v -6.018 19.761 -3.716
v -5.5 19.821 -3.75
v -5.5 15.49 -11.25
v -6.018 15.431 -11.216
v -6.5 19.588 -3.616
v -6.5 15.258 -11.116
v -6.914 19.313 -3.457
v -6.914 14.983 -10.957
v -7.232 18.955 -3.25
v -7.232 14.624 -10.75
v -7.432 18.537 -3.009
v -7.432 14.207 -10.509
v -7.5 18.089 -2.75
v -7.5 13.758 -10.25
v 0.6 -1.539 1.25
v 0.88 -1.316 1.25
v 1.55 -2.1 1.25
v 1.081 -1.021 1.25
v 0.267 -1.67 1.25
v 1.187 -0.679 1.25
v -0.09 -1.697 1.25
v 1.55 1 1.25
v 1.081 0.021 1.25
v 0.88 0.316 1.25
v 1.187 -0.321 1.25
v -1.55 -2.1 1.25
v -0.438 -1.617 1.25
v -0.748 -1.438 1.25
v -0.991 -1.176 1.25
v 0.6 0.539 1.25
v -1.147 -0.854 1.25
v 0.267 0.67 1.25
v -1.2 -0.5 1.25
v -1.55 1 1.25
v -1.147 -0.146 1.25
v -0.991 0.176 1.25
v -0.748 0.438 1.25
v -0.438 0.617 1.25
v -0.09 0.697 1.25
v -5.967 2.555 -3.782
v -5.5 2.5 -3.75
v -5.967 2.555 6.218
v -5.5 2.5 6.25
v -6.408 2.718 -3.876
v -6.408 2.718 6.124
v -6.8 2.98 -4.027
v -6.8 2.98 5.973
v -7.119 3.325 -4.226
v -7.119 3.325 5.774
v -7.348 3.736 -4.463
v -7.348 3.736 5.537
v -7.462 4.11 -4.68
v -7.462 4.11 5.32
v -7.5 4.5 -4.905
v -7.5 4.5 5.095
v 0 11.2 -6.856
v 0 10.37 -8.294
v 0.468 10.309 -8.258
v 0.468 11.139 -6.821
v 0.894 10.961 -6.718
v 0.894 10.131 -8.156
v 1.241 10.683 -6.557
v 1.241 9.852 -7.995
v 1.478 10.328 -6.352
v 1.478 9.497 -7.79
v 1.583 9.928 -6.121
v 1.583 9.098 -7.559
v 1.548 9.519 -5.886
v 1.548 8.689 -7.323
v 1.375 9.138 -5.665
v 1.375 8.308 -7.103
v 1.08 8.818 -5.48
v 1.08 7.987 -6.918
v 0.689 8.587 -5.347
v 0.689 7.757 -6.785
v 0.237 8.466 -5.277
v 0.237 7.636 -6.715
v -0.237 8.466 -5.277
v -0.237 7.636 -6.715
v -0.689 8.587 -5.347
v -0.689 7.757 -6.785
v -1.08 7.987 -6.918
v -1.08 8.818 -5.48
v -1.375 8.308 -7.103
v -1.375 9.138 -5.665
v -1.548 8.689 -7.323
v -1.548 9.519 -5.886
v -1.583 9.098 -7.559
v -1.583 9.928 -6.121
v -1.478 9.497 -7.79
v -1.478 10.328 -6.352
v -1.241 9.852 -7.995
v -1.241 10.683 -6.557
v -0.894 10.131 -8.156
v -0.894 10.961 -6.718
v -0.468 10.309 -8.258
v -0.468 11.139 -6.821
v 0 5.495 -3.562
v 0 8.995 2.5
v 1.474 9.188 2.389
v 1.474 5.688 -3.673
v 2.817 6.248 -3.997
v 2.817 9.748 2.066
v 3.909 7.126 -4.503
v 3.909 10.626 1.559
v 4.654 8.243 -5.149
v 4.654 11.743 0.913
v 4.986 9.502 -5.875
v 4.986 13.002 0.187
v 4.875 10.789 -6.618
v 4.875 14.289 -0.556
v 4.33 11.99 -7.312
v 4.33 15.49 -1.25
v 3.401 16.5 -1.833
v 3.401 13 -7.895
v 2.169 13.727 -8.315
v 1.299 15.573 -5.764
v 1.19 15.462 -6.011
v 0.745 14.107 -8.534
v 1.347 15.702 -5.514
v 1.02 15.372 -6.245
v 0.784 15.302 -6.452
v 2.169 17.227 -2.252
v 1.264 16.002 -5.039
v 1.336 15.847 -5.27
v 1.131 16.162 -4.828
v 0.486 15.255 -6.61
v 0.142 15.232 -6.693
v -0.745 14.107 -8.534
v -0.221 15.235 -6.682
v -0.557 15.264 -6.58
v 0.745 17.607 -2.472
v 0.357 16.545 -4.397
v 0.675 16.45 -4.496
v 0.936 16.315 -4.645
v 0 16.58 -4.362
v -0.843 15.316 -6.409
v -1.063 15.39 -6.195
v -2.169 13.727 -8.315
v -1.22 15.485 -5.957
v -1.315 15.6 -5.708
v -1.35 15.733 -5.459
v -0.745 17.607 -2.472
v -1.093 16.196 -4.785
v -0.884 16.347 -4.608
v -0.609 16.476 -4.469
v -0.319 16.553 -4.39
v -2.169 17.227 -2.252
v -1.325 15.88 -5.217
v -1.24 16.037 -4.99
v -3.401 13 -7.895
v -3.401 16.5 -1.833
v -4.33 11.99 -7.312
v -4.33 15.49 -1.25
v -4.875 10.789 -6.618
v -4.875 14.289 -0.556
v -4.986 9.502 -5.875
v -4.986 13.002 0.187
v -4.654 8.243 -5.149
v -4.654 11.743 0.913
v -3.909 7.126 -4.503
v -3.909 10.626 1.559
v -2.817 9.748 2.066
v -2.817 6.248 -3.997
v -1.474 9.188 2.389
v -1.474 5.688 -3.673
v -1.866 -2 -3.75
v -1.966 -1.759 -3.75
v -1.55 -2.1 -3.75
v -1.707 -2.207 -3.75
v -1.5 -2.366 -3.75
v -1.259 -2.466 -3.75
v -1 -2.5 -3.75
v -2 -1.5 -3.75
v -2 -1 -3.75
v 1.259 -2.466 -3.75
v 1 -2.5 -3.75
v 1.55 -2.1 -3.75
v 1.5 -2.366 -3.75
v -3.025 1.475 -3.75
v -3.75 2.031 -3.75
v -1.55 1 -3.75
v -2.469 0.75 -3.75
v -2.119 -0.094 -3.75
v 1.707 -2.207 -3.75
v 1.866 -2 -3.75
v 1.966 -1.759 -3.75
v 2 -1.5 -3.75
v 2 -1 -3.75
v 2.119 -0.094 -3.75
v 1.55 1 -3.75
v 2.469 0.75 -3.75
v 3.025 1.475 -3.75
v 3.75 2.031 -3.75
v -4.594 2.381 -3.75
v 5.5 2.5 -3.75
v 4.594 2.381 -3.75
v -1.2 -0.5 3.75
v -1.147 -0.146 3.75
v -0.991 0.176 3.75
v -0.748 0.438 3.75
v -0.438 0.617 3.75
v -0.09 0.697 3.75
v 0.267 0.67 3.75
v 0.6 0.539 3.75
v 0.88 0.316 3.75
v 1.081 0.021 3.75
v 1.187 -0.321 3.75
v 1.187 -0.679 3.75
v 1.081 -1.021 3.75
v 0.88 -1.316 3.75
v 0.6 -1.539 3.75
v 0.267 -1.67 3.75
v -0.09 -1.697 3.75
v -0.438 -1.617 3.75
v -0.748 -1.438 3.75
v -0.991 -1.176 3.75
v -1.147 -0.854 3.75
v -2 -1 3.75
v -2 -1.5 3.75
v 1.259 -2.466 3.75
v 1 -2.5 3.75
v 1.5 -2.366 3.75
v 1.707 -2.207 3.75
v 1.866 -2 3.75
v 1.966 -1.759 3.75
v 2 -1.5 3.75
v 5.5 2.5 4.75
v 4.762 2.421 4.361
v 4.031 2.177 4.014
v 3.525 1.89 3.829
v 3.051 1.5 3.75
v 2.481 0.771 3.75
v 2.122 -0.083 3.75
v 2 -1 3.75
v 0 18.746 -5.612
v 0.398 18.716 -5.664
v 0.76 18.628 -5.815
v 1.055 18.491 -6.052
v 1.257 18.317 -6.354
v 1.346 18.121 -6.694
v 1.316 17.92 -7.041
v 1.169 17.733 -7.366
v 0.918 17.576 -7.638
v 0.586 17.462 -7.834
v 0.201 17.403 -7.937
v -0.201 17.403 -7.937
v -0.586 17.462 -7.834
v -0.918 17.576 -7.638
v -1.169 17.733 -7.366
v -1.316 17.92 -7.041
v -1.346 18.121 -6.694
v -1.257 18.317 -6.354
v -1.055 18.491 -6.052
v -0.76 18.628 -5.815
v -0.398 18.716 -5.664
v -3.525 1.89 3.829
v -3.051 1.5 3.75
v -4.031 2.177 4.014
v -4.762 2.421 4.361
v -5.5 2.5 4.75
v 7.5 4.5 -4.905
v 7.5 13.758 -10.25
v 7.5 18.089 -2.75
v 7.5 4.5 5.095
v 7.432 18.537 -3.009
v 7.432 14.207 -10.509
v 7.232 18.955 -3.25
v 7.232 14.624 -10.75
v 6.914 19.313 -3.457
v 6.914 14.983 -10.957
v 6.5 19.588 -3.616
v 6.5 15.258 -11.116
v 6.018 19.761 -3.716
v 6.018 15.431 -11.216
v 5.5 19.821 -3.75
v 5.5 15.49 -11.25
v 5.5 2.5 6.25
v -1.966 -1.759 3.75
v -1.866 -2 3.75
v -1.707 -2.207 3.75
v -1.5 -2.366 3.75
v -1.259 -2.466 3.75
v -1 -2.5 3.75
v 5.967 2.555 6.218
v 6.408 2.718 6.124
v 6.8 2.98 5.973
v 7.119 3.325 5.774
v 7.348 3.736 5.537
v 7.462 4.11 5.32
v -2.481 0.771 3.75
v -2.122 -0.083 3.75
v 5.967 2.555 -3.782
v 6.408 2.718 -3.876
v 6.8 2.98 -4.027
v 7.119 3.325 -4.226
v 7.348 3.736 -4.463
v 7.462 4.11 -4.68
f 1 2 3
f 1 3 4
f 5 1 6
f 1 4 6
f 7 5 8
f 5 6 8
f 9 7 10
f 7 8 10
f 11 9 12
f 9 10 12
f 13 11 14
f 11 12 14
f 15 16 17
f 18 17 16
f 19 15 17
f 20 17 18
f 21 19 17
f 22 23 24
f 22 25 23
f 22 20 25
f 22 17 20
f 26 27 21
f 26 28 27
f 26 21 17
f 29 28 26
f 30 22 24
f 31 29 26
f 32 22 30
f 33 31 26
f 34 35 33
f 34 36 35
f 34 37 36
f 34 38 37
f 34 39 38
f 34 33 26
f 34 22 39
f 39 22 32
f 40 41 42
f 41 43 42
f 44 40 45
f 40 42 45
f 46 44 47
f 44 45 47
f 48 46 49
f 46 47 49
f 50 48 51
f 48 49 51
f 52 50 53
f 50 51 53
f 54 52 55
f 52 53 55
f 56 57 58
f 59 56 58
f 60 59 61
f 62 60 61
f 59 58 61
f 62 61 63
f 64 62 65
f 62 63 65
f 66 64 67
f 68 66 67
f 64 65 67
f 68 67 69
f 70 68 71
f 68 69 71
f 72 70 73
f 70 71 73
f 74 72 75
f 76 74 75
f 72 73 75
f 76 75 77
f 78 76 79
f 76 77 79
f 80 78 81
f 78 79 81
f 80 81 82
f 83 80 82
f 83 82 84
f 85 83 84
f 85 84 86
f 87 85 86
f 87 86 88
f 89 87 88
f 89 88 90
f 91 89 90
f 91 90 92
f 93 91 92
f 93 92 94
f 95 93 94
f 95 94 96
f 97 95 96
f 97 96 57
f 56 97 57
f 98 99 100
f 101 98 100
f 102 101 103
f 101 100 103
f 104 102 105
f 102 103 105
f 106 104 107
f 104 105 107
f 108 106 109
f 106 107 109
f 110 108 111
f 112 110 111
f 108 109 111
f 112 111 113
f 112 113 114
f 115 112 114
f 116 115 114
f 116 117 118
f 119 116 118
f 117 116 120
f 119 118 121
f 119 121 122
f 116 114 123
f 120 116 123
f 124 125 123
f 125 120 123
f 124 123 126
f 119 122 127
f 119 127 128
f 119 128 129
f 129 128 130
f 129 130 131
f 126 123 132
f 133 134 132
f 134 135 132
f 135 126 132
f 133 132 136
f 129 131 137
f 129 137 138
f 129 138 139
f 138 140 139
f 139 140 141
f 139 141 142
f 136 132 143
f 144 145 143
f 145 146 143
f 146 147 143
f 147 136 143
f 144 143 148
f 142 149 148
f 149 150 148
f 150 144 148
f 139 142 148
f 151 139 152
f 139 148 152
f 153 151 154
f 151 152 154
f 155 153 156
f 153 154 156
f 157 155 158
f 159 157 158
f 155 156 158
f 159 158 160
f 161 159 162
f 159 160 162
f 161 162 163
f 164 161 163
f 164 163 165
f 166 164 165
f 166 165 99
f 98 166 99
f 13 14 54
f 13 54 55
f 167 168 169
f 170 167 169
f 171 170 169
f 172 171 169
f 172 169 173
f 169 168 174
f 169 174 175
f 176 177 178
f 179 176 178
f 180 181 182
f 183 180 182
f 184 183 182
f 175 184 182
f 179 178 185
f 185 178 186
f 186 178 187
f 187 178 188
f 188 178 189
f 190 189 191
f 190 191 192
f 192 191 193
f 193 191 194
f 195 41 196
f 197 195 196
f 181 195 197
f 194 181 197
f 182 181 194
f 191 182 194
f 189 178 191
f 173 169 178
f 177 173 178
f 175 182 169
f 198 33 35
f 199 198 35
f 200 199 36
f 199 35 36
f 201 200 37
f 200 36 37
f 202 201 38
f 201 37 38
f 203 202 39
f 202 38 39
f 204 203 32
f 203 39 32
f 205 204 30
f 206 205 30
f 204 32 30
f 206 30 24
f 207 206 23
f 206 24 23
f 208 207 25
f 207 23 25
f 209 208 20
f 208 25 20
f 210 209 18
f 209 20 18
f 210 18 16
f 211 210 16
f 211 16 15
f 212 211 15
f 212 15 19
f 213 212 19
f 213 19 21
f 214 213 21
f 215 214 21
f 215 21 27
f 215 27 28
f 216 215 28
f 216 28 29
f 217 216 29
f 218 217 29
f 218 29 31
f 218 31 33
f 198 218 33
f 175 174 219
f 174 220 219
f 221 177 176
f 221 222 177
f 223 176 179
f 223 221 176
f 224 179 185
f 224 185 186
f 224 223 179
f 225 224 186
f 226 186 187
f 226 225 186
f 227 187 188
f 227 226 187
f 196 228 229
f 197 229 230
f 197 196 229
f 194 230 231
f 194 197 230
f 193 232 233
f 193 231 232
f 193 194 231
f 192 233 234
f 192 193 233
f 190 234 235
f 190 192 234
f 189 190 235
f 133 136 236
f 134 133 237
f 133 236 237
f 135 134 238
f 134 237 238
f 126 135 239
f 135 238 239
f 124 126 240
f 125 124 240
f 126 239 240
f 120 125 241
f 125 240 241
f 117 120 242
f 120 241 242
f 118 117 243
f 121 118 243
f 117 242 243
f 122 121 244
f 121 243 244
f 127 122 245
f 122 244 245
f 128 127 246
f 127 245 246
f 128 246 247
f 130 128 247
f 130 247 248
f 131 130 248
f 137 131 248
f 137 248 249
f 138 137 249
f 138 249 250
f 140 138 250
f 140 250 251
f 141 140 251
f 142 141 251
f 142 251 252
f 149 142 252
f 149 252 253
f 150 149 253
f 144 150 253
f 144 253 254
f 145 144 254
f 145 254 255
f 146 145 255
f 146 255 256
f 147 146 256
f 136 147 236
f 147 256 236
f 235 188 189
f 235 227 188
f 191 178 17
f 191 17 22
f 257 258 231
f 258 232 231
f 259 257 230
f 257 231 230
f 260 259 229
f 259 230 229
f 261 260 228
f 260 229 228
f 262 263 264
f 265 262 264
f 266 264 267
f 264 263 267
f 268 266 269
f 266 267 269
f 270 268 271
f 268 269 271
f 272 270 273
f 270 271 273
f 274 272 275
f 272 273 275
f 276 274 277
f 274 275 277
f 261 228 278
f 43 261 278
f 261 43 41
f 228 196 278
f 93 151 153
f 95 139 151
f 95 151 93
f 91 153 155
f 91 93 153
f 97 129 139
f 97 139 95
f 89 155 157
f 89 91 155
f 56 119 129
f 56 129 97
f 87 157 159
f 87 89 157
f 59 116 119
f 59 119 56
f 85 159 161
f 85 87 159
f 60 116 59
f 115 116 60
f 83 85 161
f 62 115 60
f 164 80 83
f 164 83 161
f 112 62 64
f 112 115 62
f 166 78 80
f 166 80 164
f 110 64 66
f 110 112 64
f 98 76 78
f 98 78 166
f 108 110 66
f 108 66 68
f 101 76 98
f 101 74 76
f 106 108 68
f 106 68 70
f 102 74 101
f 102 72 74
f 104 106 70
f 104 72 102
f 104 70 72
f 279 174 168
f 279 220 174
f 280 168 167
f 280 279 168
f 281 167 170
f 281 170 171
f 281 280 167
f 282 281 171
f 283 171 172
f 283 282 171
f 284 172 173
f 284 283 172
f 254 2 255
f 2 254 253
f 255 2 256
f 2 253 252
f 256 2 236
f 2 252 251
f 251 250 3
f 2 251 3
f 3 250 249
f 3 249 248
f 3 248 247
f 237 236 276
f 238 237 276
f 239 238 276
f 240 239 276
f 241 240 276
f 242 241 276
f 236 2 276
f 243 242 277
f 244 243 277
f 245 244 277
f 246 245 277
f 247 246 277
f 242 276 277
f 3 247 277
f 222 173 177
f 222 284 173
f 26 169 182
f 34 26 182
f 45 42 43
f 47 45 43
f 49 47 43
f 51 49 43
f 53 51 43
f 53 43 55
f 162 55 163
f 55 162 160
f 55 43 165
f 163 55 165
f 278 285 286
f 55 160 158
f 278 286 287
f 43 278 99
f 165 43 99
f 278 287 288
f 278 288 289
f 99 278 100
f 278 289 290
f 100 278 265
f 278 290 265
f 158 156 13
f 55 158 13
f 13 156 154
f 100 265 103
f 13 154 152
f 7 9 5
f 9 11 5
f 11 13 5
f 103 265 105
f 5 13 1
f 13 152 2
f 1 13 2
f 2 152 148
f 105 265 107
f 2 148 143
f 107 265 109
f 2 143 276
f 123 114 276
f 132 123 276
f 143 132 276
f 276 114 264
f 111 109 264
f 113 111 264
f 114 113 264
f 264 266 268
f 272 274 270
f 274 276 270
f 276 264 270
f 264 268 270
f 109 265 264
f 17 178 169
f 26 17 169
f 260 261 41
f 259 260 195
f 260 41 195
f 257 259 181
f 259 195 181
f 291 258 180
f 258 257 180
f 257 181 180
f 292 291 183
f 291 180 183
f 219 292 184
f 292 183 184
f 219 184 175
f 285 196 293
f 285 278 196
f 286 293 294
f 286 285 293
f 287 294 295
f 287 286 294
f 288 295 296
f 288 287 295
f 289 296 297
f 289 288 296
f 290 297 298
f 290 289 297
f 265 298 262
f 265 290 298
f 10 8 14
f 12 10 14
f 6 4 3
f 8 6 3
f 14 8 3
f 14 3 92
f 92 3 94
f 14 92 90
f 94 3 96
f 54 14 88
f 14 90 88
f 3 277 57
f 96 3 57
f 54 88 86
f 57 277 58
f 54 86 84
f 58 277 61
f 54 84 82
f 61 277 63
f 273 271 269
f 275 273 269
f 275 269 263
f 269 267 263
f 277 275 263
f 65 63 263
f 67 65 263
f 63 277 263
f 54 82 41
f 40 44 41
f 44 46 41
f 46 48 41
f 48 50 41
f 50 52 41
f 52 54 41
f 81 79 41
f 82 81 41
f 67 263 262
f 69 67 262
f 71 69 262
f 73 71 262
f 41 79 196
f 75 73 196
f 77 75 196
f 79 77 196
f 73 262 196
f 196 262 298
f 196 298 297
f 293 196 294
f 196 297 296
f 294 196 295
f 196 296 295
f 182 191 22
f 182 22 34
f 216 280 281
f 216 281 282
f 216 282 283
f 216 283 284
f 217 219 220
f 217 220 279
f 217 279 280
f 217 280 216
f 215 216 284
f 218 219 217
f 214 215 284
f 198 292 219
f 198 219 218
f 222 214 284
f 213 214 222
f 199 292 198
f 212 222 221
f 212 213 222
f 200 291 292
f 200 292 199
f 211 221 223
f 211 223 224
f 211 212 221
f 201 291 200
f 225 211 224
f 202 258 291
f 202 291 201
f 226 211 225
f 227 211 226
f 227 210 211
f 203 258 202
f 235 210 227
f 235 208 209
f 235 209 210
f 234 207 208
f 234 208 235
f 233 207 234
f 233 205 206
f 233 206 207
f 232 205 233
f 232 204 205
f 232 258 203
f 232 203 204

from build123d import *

# Parameters (mm, degrees)
SKETCH1_W            = 4
SKETCH1_H            = 5
BOSS_EXTRUDE1_DEPTH  = 3.75
SKETCH2_W            = 3.1
SKETCH2_H            = 3.1
CUT_EXTRUDE1_DEPTH   = 5
BOSS_EXTRUDE2_DEPTH  = 7.5
M2_CLEARANCE_HOLE1_D = 2.4
FILLET1_R            = 3.5
FILLET2_R            = 2
FILLET3_R            = 1
SKETCH17_R           = 5
CUT_EXTRUDE2_DEPTH   = 7
SKETCH5_R            = 1.5875
CUT_EXTRUDE3_DEPTH   = 5
FILLET4_R            = 1
SKETCH18_R           = 1.35
CUT_EXTRUDE4_DEPTH   = 5


with BuildPart() as part:
    # Sketch1 → Boss-Extrude1 (new, symmetric)
    with BuildSketch(Plane.XY):
        Rectangle(SKETCH1_W, SKETCH1_H)
    extrude(amount=BOSS_EXTRUDE1_DEPTH, both=True)

    # Sketch2 → Cut-Extrude1 (cut)
    with BuildSketch(Plane(origin=(0, 0, -3.75), x_dir=(-1, 0, 0), z_dir=(0, 0, -1))):
        with Locations((0, -0.55)):
            Rectangle(SKETCH2_W, SKETCH2_H)
    extrude(amount=-CUT_EXTRUDE1_DEPTH, mode=Mode.SUBTRACT)

    # Sketch3 → Boss-Extrude2 (add, symmetric)
    with BuildSketch(Plane(origin=(0, 0, 0), x_dir=(0, 0, -1), z_dir=(1, 0, 0))):
        Polygon((-6.25, 2.5), (3.75, 19.820508076), (11.25, 15.490381057), (3.75, 2.5), align=None)
    extrude(amount=BOSS_EXTRUDE2_DEPTH, both=True)

    # M2 Clearance Hole1 (through all)
    with Locations(Plane.XY.offset(3.75)):
        with Locations((0, -0.5)):
            Hole(M2_CLEARANCE_HOLE1_D / 2)

    # Fillet1
    fillet1_edges = [part.edges().sort_by_distance(p)[0] for p in [
        (-2, 2.5, 0),
        (2, 2.5, 0),
    ]]
    fillet(fillet1_edges, radius=FILLET1_R)

    # Fillet2
    fillet2_edges = [part.edges().sort_by_distance(p)[0] for p in [
        (-7.5, 17.655444566, -7.5),
        (7.5, 17.655444566, -7.5),
        (7.5, 2.5, 1.25),
        (-7.5, 2.5, 1.25),
    ]]
    fillet(fillet2_edges, radius=FILLET2_R - 0.0001)  # a hair under: the kernel refuses the full size

    # Fillet3
    fillet3_edges = [part.edges().sort_by_distance(p)[0] for p in [
        (2, -2.5, 0),
        (-2, -2.5, 0),
    ]]
    fillet(fillet3_edges, radius=FILLET3_R)

    # Sketch17 → Cut-Extrude2 (cut)
    with BuildSketch(Plane(origin=(0, 3.331329387, 5.770031755), x_dir=(1, 0, 0), z_dir=(0, 0.5000000000000039, 0.8660254037844365))):
        with Locations(Location((0, 11.540063509, 0), (0, 0, 270))):
            Circle(SKETCH17_R)
    extrude(amount=-CUT_EXTRUDE2_DEPTH, mode=Mode.SUBTRACT)

    # Sketch5 → Cut-Extrude3 (cut)
    with BuildSketch(Plane(origin=(0, -0.998797632, -1.729968245), x_dir=(-1, 0, 0), z_dir=(0, -0.5000000000000038, -0.8660254037844366))):
        with Locations(Location((0, 11.540063509, 0), (0, 0, 90))):
            Circle(SKETCH5_R)
    extrude(amount=-CUT_EXTRUDE3_DEPTH, mode=Mode.SUBTRACT)

    # Fillet4
    fillet4_edges = [part.edges().sort_by_distance(p)[0] for p in [
        (0, 2.5, 3.75),
    ]]
    fillet(fillet4_edges, radius=FILLET4_R)

    # Sketch18 → Cut-Extrude4 (cut)
    with BuildSketch(Plane(origin=(0, 16.489178689, -9.520031755), x_dir=(1, 0, 0), z_dir=(0, 0.8660254037844366, -0.5000000000000038))):
        with Locations(Location((0, -3.162658774, 0), (0, 0, 270))):
            Circle(SKETCH18_R)
    extrude(amount=-CUT_EXTRUDE4_DEPTH, mode=Mode.SUBTRACT)


solid = part.part
